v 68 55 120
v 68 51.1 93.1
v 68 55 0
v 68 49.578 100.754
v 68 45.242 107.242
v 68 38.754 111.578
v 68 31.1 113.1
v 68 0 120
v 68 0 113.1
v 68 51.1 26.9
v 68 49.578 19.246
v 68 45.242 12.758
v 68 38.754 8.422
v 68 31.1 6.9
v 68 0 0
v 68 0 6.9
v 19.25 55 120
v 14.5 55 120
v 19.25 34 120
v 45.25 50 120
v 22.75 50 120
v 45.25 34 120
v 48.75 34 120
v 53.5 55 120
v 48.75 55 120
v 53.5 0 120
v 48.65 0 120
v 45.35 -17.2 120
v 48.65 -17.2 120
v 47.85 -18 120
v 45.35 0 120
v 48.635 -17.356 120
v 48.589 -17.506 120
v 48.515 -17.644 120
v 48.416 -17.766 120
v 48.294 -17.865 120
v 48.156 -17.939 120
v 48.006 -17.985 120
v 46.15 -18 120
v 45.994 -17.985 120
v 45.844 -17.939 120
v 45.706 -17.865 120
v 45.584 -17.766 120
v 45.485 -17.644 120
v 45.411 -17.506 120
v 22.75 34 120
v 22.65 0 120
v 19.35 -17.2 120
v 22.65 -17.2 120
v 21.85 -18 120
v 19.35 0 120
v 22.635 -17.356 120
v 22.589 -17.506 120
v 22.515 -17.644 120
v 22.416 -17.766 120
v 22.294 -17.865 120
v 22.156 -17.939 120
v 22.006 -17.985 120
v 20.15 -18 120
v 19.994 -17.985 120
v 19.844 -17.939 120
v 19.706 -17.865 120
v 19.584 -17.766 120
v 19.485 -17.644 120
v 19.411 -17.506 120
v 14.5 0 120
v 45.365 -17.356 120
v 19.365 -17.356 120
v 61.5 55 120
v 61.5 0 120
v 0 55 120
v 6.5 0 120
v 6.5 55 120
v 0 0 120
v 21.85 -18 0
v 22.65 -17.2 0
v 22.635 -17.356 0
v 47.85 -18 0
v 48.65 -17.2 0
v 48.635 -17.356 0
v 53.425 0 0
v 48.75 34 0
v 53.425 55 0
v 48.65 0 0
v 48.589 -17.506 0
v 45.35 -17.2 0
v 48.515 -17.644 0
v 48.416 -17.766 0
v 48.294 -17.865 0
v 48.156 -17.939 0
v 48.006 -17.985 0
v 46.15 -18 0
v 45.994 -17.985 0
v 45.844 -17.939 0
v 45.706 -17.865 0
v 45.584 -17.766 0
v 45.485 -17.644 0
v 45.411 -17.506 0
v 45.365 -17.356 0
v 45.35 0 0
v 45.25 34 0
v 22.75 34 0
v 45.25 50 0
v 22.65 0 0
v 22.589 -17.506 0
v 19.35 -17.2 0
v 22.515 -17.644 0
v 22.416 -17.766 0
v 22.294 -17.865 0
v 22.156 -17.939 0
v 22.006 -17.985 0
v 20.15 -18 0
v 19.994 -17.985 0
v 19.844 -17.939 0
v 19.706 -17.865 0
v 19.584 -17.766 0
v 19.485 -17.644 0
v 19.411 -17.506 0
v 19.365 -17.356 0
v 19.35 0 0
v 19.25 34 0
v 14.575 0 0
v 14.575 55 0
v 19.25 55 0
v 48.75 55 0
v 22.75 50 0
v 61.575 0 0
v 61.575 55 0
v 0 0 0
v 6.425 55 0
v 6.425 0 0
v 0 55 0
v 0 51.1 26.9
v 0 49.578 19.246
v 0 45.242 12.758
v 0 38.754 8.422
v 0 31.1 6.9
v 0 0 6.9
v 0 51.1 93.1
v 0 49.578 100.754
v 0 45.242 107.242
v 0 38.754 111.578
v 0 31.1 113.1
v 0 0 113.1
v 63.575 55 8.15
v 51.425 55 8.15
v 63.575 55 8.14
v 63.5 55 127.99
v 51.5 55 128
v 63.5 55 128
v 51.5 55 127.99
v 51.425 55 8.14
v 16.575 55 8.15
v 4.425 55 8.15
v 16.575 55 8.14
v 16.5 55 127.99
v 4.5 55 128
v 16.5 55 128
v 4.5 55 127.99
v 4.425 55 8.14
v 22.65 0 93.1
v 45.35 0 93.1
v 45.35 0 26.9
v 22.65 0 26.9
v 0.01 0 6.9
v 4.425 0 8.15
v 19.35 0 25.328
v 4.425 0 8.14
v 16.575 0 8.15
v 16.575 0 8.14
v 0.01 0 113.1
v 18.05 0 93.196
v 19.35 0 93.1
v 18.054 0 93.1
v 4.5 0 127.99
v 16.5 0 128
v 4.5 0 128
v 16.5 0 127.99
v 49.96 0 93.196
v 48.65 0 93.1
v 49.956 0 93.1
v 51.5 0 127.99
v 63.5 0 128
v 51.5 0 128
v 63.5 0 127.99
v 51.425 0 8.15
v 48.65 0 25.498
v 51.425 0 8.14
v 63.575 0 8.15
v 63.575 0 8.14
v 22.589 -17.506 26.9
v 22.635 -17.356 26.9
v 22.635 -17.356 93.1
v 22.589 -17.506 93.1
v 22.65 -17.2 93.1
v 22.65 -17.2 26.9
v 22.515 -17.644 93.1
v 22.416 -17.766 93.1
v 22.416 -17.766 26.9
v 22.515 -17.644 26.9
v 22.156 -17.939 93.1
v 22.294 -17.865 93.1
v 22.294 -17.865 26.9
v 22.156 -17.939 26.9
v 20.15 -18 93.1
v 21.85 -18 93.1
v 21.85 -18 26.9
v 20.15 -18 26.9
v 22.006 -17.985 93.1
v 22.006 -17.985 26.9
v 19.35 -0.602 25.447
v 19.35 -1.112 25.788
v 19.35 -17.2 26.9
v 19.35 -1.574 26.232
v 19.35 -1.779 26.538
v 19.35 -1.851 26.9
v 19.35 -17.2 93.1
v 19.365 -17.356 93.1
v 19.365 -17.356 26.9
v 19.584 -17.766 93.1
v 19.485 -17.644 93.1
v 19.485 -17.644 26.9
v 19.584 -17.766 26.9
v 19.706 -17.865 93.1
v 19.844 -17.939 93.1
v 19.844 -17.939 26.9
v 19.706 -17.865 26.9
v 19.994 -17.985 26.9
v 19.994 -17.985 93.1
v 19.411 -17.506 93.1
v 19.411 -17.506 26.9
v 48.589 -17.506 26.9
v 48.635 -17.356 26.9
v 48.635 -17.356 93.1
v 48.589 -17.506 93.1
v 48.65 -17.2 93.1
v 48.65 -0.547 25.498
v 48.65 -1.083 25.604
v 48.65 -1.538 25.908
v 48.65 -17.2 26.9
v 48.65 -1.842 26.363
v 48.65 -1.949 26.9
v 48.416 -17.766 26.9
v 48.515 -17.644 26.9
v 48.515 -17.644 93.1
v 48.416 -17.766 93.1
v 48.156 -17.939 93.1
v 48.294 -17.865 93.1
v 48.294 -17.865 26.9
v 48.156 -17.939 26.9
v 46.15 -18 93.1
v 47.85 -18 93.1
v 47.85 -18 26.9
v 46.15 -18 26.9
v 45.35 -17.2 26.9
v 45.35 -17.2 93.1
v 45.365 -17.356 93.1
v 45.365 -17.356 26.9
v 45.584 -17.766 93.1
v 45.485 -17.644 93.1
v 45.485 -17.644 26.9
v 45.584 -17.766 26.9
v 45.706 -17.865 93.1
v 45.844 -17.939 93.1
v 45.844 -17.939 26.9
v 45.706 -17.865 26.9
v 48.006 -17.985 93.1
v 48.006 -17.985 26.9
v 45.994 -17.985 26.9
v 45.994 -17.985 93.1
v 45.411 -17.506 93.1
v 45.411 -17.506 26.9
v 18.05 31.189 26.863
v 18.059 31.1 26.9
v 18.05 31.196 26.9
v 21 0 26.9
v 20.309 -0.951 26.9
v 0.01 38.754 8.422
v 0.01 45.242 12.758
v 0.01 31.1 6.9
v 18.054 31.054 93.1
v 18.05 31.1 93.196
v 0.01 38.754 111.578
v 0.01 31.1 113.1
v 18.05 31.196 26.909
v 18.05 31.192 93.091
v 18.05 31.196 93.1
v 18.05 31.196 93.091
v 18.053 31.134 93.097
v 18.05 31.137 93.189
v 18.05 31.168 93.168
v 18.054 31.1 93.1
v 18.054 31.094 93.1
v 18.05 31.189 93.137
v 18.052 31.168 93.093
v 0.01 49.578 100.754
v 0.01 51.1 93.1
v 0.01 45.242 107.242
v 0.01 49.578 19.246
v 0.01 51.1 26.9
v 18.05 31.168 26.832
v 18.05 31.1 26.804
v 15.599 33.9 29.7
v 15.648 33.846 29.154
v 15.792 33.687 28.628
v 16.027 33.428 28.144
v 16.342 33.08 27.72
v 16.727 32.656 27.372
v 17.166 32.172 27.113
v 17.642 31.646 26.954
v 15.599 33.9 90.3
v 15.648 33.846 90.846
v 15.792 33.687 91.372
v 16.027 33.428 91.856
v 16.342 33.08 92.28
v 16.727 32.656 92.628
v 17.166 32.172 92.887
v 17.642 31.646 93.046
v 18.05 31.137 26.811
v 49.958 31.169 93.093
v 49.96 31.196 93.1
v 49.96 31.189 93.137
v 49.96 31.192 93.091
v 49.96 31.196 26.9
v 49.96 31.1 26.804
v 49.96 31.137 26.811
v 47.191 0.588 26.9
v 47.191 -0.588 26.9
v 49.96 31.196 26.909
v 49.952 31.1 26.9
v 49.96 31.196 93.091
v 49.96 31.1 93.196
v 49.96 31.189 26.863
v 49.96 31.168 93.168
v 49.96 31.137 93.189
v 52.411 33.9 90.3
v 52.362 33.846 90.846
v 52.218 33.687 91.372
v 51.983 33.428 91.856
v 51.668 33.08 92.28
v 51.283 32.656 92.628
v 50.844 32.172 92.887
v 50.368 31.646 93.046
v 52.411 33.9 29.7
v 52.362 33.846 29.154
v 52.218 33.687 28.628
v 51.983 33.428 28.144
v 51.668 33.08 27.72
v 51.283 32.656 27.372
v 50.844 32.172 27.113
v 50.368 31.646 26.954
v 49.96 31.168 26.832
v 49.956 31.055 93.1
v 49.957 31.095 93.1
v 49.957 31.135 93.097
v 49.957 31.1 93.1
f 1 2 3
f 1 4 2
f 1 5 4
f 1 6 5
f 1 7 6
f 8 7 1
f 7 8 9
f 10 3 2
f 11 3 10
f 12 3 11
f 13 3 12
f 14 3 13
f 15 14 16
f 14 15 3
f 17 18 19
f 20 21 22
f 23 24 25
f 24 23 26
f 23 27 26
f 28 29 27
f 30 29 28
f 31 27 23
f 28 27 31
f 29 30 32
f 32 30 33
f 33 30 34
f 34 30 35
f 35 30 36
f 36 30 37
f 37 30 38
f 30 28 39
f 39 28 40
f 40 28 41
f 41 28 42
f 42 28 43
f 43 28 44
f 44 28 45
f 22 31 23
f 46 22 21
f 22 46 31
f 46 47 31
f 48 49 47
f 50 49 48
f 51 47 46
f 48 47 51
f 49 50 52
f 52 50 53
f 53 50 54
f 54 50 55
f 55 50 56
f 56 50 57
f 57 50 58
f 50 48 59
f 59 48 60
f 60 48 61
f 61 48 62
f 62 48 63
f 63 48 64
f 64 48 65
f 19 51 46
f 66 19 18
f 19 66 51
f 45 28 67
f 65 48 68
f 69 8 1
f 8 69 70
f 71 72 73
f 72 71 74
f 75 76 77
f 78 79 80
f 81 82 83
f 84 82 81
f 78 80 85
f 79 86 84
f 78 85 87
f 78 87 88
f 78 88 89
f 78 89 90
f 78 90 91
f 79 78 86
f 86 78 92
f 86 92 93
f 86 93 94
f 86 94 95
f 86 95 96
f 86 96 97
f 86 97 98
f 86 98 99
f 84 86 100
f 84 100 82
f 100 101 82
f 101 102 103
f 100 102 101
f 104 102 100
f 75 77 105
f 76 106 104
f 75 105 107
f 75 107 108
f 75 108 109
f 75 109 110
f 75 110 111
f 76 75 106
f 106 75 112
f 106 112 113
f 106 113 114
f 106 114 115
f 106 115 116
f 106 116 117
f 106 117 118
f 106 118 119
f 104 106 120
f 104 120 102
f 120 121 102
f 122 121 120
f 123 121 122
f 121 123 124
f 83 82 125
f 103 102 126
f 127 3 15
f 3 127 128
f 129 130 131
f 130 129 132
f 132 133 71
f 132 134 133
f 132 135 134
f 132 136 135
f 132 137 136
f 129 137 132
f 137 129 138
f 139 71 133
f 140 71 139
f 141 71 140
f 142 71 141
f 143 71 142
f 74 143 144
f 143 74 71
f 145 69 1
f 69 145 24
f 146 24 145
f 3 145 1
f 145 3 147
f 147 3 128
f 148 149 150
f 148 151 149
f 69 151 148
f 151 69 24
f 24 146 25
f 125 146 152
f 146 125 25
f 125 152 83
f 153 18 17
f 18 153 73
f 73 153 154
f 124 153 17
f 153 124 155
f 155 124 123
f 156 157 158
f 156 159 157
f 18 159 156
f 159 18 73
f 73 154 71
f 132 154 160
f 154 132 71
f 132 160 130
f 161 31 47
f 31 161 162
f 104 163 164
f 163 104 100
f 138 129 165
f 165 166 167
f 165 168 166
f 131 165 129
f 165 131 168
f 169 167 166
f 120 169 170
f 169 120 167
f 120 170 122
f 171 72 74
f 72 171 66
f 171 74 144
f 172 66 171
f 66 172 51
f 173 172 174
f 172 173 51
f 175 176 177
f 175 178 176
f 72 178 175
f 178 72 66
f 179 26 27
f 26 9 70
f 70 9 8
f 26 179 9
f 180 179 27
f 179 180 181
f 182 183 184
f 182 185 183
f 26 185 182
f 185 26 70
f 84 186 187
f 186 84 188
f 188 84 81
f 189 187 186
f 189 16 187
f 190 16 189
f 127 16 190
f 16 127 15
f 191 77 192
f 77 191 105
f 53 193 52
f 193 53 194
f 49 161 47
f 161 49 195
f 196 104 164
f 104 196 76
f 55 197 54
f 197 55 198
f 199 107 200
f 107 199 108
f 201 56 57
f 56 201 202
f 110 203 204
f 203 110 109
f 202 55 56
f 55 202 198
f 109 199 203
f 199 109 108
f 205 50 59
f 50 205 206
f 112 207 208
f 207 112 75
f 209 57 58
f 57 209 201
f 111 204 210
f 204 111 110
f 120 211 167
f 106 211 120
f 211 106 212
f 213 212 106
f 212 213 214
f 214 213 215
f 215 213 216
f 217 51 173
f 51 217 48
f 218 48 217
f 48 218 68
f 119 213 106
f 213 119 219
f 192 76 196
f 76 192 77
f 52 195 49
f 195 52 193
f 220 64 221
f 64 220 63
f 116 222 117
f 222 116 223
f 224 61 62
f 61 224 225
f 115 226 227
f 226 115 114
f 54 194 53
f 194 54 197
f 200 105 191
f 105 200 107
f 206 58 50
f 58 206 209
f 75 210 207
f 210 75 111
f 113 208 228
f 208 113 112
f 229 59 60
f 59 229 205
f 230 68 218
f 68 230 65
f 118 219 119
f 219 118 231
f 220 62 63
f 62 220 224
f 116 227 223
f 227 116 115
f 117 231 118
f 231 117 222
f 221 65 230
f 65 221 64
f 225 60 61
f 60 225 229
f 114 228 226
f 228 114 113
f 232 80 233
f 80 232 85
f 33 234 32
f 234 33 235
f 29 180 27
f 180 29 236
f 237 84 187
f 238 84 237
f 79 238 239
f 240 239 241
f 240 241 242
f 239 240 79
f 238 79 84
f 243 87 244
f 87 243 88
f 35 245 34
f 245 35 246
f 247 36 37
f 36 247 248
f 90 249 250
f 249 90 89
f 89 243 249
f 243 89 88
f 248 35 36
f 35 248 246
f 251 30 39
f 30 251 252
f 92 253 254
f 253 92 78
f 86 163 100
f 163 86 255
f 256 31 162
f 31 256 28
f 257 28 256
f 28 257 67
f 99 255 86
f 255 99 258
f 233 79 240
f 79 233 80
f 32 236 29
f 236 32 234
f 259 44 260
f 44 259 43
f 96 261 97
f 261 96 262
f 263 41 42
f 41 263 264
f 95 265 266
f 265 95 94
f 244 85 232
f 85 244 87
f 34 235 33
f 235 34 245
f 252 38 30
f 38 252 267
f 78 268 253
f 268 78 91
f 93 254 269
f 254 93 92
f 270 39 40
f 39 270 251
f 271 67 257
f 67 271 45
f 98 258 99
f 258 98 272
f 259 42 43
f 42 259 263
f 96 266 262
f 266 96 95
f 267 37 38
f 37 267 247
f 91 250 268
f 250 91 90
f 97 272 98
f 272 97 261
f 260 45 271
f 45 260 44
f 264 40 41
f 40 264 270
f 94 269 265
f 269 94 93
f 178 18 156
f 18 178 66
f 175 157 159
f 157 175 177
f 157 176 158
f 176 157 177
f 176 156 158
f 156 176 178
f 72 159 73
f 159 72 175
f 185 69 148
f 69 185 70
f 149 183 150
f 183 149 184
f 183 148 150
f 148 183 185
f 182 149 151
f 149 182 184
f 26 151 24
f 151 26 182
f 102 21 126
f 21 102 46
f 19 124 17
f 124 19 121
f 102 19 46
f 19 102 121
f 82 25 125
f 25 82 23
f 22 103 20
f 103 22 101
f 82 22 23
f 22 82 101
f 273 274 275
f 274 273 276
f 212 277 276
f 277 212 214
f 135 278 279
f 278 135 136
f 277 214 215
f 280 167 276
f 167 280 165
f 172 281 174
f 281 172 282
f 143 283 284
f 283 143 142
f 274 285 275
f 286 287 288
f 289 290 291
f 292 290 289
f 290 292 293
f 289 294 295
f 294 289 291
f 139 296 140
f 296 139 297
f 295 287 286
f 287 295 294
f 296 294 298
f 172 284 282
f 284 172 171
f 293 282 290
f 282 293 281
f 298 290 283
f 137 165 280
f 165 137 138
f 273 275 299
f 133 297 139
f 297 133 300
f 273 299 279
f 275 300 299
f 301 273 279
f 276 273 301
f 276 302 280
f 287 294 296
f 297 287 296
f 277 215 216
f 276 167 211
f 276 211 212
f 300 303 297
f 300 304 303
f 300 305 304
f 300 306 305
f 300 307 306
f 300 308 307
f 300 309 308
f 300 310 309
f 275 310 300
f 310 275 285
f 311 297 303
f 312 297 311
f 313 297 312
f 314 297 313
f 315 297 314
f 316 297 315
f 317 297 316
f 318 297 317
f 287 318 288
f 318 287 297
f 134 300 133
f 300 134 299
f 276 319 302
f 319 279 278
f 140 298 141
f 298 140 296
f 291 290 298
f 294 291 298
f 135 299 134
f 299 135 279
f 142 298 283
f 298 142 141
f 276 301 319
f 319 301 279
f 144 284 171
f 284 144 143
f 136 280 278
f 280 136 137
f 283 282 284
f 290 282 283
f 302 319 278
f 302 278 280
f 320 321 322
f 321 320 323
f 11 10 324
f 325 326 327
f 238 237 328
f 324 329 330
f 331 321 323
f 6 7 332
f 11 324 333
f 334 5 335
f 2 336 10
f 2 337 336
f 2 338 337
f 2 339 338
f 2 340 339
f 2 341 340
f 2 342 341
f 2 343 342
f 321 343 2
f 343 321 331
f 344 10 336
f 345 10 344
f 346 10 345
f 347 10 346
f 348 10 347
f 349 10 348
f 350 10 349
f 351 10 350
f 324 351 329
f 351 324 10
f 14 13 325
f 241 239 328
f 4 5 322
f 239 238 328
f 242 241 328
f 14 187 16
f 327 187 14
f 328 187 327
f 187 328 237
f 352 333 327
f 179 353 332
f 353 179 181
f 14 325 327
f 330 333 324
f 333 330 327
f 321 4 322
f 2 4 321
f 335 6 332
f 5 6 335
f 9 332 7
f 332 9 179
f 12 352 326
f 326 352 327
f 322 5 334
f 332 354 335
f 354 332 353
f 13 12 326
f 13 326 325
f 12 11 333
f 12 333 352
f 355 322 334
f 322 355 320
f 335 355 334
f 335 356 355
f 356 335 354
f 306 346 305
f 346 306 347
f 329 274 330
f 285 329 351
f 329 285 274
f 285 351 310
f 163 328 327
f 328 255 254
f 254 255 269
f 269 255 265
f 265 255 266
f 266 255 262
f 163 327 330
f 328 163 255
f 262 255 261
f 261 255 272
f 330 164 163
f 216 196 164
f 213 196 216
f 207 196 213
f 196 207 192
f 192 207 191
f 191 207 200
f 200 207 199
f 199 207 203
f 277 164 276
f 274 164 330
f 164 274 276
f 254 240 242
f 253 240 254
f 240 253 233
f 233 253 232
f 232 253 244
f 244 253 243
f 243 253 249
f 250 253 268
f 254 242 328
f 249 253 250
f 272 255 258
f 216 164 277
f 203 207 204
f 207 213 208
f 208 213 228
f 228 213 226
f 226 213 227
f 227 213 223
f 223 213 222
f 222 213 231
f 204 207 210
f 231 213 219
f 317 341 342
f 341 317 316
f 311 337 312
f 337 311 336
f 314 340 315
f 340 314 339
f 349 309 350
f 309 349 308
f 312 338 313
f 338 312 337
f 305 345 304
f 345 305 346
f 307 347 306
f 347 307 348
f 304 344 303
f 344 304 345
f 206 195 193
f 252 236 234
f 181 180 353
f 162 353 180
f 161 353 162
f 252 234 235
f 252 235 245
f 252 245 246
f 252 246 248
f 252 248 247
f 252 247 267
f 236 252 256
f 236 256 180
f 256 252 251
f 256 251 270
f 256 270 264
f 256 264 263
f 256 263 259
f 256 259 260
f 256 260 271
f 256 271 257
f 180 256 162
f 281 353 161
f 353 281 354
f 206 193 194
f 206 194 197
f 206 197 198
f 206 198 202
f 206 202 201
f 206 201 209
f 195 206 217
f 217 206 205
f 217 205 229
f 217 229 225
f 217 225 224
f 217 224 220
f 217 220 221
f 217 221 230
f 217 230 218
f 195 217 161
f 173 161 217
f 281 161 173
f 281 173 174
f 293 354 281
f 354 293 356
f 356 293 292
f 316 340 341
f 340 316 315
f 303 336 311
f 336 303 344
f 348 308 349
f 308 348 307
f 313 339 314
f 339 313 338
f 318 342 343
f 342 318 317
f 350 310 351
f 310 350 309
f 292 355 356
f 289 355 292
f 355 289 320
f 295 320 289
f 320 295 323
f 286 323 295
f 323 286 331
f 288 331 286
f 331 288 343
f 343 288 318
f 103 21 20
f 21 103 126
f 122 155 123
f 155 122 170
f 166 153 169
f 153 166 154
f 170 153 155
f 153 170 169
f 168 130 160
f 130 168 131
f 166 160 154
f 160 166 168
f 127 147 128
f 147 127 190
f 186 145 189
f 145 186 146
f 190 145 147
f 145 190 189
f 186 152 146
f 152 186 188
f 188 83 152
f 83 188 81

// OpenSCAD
// ============================================================
// Midea Portasplit Cover - Repeatable middle piece
// Siegenia HS GR 260 sliding door rail
// ============================================================

// Piece dimensions
width       = 68;
depth       = 55;
height      = 120;

// Door-side tenons (protrude toward door in -Y direction)
tenon_w         = 3.3;
tenon_d         = 18;
tenon_h         = height;   // Z-height of door tenons (defaults to full piece height)
tenon_corner_r  = 0.8;      // Corner radius of door tenons (0 = sharp)
tenon_spacing   = 26;

// Wall-side mortises (cut into back face, +Y side)
mortise_w       = 3.5;
mortise_d       = 30;        // Overall Y extent of wall-side engagement zone
ear_d           = 0;         // Y-depth of exterior ear blocks (shorter = less reach from back face)
inner_tenon_d   = 5;        // Put it to 38mm when need to clear tenon from window
                             // Use 5 when nothing in the channel
mortise_inner_d = 21;        // Mortise slot depth — matches tenon length by default
mortise_end_h   = 5;         // Height of exterior ears at top and bottom
mortise_spacing = 26;

// Wall-side structural details
mortise_wall_thickness = 3.5;  // Minimum wall each side of center channel
channel_w               = 15;  // Center channel width

// Dovetail tongue/groove (vertical assembly via top/bottom faces)
tongue_h      = 8;
tongue_w_top  = 12;
tongue_w_bot  = 8;

// Tolerance for all fits (PETG)
tolerance = 0.15;

// Derived positions
tenon_left_x  = width / 2 - tenon_spacing / 2;
tenon_right_x = width / 2 + tenon_spacing / 2;

// Tongue centers positioned symmetrically outside tenon zones
tongue_left_center_x  = tenon_left_x / 2;
tongue_right_center_x = tenon_right_x + (width - tenon_right_x) / 2;

// Channel bounds: mortises + wall thickness on each side
mortise_left_x  = width / 2 - mortise_spacing / 2;
mortise_right_x = width / 2 + mortise_spacing / 2;
channel_x_min   = mortise_left_x + mortise_w / 2 + mortise_wall_thickness;
channel_x_max   = mortise_right_x - mortise_w / 2 - mortise_wall_thickness;

inner_wall_d = depth - 5; // Depth of inner walls between mortise slots and channel

// Portasplit hose slot (27mm × 60mm flat hose, Midea Portasplit)
// Through-hole in X (side face to side face); open at window face (Y=0) for non-detachable hose.
hose_hole      = true;          // Set true to cut hose slot in this block
hose_w         = 31;            // Hose thickness → slot depth from window face (Y direction)
hose_h         = 66;            // Hose face → slot height (Z direction)
hose_z         = height / 2;    // Z center of hose slot (default: piece center)
hose_tolerance = 0.1;           // Clearance per side
hose_corner_r  = 2.8;             // Fillet on back-wall corners inside the slot (window face stays sharp)
outer_fillet_r = 20;             // Fillet around hole perimeter at each side face (cable exits here)

// ============================================================
// COMPONENT MODULES
// ============================================================

// Door-side tenon: rounded at door-tip only, square at body base
module door_tenon(x_pos) {
    r = tenon_corner_r;
    translate([x_pos - tenon_w / 2, -tenon_d, 0])
        hull() {
            // Door-tip: two cylinders give a rounded end
            translate([r,         r, 0]) cylinder(r=r, h=tenon_h, $fn=32);
            translate([tenon_w-r, r, 0]) cylinder(r=r, h=tenon_h, $fn=32);
            // Body base: full-width flat slice — keeps this end square
            translate([0, tenon_d - 0.01, 0]) cube([tenon_w, 0.01, tenon_h]);
        }
}

// Wall-side exterior ear: small block at top or bottom, flanks each mortise
// side: "left" or "right" relative to mortise center
// z_pos: "top" or "bottom"
module exterior_ear(mortise_x, side, z_pos) {
    ear_x = (side == "left") 
        ? mortise_x - mortise_w / 2 - 5 
        : mortise_x + mortise_w / 2;
    ear_z = (z_pos == "top") 
        ? height - mortise_end_h 
        : 0;
    
    translate([ear_x, depth, ear_z])
        cube([5, ear_d, mortise_end_h]);
}

// Dovetail tongue on top face: trapezoidal cross-section in X-Z plane
// Narrow at base (tongue_w_bot), wide at tip (tongue_w_top) — ~14° half-angle with defaults
// Inserted by sliding piece horizontally (X direction); wide tip locks against groove opening
module dovetail_tongue(tongue_center_x) {
    translate([tongue_center_x, 0, height])
        hull() {
            translate([-tongue_w_bot / 2, 0, 0])
                cube([tongue_w_bot, depth, 0.01]);
            translate([-tongue_w_top / 2, 0, tongue_h - 0.01])
                cube([tongue_w_top, depth, 0.01]);
        }
}

// Portasplit hose slot: open at window face (Y=0), through-hole in X
// Back-wall (Y=sd) corners are rounded internally; window face (Y=0) stays sharp
module hose_slot() {
    sd = hose_w + hose_tolerance;
    sh = hose_h + 2 * hose_tolerance;
    r  = hose_corner_r;
    // Front cylinders at Y=-1 (outside body) → window face remains a sharp rectangle
    // Back cylinders at Y=sd → back-wall corners are rounded with radius r
    hull() {
        for (zoff = [r, sh - r])
            for (yoff = [-1, sd])
                translate([-1, yoff, hose_z - sh/2 + zoff])
                    rotate([0, 90, 0])
                        cylinder(r=r, h=width+2, $fn=32);
    }
}

// Outer perimeter fillet: rounded lip on each X face.
// Uses the arc centered at (r, zt+r) / (r, zb-r): xi = r(1-cosθ), ri = r(1-sinθ).
// This arc has a HORIZONTAL tangent at the face (xi=0, ri=r) — the surface starts flush
// with the face and curves smoothly inward, creating a visible rounded lip on the outside
// of the slot edge rather than a funnel hole going into the piece.
module hose_outer_fillet() {
    sd  = hose_w + hose_tolerance;
    sh  = hose_h + 2 * hose_tolerance;
    r   = outer_fillet_r;
    zb  = hose_z - sh / 2;
    zt  = hose_z + sh / 2;
    N   = 16;
    eps = 0.01;

    // Left face (x=0)
    hull() {
        for (i = [0:N-1])
            for (yc = [0, sd])
                for (zc = [zb, zt])
                    translate([r * (1 - cos(90 * i / N)), yc, zc])
                        rotate([0, 90, 0])
                            cylinder(r = r * (1 - sin(90 * i / N)), h = eps, $fn = 16);
        translate([r, 0, zb]) cylinder([eps, sd, sh]);
    }

    // Right face (x=width)
    hull() {
        for (i = [0:N-1])
            for (yc = [0, sd])
                for (zc = [zb, zt])
                    translate([width - r * (1 - cos(90 * i / N)), yc, zc])
                        rotate([0, 90, 0])
                            cylinder(r = r * (1 - sin(90 * i / N)), h = eps, $fn = 16);
        translate([width - r, 0, zb]) cylinder([eps, sd, sh]);
    }
}

// Dovetail groove on bottom face: complement of tongue, with tolerance applied
// Opening (Z=0) is narrow, depth (Z=tongue_h) is wide — tongue tip can't exit through opening
module dovetail_groove(tongue_center_x) {
    translate([tongue_center_x, -1, 0])
        hull() {
            translate([-(tongue_w_bot + tolerance) / 2, 0, 0])
                cube([tongue_w_bot + tolerance, depth + 2, 0.01]);
            translate([-(tongue_w_top + tolerance) / 2, 0, tongue_h + tolerance - 0.01])
                cube([tongue_w_top + tolerance, depth + 2, 0.01]);
        }
}


// ============================================================
// MAIN GEOMETRY
// ============================================================

module portasplit_cover() {
    difference() {
        // Additive features
        union() {
            // Main body
            cube([width, depth, height]);

            // Door-side tenons
            door_tenon(tenon_left_x);
            door_tenon(tenon_right_x);

            // Wall-side exterior ears (structural support around mortises)
            for (mortise_x = [mortise_left_x, mortise_right_x]) {
                exterior_ear(mortise_x, "left", "top");
                exterior_ear(mortise_x, "left", "bottom");
                exterior_ear(mortise_x, "right", "top");
                exterior_ear(mortise_x, "right", "bottom");
            }

            // Dovetail tongues on top face (for vertical stacking)
            dovetail_tongue(tongue_left_center_x);
            dovetail_tongue(tongue_right_center_x);
        }

        // Subtractive features (cuts)

        // Inner walls: cut from wall side inward, leaving inner_wall_d depth from door side
        translate([mortise_left_x + mortise_w / 2, inner_wall_d, -1])
            cube([mortise_wall_thickness, depth - inner_wall_d + 1, height + 2]);
        translate([channel_x_max, inner_wall_d, -1])
            cube([mortise_wall_thickness, depth - inner_wall_d + 1, height + 2]);

        // Wall-side mortises: receive tenons from wall rail groove
        for (mortise_x = [mortise_left_x, mortise_right_x]) {
            translate([mortise_x - mortise_w / 2, depth - mortise_inner_d, -1])
                cube([mortise_w, mortise_inner_d + 1, height + 2]);
        }

        // Wall-side center channel: clearance for fixed wall pins
        // Centered between mortises, minimum wall thickness on each side
        translate([channel_x_min, depth - inner_tenon_d, -1])
            cube([channel_x_max - channel_x_min, inner_tenon_d + 1, height + 2]);

        // Dovetail grooves on bottom face: receive tongues from piece below
        dovetail_groove(tongue_left_center_x);
        dovetail_groove(tongue_right_center_x);

        // Portasplit hose slot (only when enabled)
        if (hose_hole) {
            hose_slot();
            hose_outer_fillet();
            // Remove door tenons in the hose slot Z range
            translate([-tenon_d - 1, -tenon_d - 1, hose_z - (hose_h + 2*hose_tolerance)/2])
                cube([width + 2*tenon_d + 2, tenon_d + 1, hose_h + 2*hose_tolerance]);
        }
    }
}

// Render the part
portasplit_cover();
